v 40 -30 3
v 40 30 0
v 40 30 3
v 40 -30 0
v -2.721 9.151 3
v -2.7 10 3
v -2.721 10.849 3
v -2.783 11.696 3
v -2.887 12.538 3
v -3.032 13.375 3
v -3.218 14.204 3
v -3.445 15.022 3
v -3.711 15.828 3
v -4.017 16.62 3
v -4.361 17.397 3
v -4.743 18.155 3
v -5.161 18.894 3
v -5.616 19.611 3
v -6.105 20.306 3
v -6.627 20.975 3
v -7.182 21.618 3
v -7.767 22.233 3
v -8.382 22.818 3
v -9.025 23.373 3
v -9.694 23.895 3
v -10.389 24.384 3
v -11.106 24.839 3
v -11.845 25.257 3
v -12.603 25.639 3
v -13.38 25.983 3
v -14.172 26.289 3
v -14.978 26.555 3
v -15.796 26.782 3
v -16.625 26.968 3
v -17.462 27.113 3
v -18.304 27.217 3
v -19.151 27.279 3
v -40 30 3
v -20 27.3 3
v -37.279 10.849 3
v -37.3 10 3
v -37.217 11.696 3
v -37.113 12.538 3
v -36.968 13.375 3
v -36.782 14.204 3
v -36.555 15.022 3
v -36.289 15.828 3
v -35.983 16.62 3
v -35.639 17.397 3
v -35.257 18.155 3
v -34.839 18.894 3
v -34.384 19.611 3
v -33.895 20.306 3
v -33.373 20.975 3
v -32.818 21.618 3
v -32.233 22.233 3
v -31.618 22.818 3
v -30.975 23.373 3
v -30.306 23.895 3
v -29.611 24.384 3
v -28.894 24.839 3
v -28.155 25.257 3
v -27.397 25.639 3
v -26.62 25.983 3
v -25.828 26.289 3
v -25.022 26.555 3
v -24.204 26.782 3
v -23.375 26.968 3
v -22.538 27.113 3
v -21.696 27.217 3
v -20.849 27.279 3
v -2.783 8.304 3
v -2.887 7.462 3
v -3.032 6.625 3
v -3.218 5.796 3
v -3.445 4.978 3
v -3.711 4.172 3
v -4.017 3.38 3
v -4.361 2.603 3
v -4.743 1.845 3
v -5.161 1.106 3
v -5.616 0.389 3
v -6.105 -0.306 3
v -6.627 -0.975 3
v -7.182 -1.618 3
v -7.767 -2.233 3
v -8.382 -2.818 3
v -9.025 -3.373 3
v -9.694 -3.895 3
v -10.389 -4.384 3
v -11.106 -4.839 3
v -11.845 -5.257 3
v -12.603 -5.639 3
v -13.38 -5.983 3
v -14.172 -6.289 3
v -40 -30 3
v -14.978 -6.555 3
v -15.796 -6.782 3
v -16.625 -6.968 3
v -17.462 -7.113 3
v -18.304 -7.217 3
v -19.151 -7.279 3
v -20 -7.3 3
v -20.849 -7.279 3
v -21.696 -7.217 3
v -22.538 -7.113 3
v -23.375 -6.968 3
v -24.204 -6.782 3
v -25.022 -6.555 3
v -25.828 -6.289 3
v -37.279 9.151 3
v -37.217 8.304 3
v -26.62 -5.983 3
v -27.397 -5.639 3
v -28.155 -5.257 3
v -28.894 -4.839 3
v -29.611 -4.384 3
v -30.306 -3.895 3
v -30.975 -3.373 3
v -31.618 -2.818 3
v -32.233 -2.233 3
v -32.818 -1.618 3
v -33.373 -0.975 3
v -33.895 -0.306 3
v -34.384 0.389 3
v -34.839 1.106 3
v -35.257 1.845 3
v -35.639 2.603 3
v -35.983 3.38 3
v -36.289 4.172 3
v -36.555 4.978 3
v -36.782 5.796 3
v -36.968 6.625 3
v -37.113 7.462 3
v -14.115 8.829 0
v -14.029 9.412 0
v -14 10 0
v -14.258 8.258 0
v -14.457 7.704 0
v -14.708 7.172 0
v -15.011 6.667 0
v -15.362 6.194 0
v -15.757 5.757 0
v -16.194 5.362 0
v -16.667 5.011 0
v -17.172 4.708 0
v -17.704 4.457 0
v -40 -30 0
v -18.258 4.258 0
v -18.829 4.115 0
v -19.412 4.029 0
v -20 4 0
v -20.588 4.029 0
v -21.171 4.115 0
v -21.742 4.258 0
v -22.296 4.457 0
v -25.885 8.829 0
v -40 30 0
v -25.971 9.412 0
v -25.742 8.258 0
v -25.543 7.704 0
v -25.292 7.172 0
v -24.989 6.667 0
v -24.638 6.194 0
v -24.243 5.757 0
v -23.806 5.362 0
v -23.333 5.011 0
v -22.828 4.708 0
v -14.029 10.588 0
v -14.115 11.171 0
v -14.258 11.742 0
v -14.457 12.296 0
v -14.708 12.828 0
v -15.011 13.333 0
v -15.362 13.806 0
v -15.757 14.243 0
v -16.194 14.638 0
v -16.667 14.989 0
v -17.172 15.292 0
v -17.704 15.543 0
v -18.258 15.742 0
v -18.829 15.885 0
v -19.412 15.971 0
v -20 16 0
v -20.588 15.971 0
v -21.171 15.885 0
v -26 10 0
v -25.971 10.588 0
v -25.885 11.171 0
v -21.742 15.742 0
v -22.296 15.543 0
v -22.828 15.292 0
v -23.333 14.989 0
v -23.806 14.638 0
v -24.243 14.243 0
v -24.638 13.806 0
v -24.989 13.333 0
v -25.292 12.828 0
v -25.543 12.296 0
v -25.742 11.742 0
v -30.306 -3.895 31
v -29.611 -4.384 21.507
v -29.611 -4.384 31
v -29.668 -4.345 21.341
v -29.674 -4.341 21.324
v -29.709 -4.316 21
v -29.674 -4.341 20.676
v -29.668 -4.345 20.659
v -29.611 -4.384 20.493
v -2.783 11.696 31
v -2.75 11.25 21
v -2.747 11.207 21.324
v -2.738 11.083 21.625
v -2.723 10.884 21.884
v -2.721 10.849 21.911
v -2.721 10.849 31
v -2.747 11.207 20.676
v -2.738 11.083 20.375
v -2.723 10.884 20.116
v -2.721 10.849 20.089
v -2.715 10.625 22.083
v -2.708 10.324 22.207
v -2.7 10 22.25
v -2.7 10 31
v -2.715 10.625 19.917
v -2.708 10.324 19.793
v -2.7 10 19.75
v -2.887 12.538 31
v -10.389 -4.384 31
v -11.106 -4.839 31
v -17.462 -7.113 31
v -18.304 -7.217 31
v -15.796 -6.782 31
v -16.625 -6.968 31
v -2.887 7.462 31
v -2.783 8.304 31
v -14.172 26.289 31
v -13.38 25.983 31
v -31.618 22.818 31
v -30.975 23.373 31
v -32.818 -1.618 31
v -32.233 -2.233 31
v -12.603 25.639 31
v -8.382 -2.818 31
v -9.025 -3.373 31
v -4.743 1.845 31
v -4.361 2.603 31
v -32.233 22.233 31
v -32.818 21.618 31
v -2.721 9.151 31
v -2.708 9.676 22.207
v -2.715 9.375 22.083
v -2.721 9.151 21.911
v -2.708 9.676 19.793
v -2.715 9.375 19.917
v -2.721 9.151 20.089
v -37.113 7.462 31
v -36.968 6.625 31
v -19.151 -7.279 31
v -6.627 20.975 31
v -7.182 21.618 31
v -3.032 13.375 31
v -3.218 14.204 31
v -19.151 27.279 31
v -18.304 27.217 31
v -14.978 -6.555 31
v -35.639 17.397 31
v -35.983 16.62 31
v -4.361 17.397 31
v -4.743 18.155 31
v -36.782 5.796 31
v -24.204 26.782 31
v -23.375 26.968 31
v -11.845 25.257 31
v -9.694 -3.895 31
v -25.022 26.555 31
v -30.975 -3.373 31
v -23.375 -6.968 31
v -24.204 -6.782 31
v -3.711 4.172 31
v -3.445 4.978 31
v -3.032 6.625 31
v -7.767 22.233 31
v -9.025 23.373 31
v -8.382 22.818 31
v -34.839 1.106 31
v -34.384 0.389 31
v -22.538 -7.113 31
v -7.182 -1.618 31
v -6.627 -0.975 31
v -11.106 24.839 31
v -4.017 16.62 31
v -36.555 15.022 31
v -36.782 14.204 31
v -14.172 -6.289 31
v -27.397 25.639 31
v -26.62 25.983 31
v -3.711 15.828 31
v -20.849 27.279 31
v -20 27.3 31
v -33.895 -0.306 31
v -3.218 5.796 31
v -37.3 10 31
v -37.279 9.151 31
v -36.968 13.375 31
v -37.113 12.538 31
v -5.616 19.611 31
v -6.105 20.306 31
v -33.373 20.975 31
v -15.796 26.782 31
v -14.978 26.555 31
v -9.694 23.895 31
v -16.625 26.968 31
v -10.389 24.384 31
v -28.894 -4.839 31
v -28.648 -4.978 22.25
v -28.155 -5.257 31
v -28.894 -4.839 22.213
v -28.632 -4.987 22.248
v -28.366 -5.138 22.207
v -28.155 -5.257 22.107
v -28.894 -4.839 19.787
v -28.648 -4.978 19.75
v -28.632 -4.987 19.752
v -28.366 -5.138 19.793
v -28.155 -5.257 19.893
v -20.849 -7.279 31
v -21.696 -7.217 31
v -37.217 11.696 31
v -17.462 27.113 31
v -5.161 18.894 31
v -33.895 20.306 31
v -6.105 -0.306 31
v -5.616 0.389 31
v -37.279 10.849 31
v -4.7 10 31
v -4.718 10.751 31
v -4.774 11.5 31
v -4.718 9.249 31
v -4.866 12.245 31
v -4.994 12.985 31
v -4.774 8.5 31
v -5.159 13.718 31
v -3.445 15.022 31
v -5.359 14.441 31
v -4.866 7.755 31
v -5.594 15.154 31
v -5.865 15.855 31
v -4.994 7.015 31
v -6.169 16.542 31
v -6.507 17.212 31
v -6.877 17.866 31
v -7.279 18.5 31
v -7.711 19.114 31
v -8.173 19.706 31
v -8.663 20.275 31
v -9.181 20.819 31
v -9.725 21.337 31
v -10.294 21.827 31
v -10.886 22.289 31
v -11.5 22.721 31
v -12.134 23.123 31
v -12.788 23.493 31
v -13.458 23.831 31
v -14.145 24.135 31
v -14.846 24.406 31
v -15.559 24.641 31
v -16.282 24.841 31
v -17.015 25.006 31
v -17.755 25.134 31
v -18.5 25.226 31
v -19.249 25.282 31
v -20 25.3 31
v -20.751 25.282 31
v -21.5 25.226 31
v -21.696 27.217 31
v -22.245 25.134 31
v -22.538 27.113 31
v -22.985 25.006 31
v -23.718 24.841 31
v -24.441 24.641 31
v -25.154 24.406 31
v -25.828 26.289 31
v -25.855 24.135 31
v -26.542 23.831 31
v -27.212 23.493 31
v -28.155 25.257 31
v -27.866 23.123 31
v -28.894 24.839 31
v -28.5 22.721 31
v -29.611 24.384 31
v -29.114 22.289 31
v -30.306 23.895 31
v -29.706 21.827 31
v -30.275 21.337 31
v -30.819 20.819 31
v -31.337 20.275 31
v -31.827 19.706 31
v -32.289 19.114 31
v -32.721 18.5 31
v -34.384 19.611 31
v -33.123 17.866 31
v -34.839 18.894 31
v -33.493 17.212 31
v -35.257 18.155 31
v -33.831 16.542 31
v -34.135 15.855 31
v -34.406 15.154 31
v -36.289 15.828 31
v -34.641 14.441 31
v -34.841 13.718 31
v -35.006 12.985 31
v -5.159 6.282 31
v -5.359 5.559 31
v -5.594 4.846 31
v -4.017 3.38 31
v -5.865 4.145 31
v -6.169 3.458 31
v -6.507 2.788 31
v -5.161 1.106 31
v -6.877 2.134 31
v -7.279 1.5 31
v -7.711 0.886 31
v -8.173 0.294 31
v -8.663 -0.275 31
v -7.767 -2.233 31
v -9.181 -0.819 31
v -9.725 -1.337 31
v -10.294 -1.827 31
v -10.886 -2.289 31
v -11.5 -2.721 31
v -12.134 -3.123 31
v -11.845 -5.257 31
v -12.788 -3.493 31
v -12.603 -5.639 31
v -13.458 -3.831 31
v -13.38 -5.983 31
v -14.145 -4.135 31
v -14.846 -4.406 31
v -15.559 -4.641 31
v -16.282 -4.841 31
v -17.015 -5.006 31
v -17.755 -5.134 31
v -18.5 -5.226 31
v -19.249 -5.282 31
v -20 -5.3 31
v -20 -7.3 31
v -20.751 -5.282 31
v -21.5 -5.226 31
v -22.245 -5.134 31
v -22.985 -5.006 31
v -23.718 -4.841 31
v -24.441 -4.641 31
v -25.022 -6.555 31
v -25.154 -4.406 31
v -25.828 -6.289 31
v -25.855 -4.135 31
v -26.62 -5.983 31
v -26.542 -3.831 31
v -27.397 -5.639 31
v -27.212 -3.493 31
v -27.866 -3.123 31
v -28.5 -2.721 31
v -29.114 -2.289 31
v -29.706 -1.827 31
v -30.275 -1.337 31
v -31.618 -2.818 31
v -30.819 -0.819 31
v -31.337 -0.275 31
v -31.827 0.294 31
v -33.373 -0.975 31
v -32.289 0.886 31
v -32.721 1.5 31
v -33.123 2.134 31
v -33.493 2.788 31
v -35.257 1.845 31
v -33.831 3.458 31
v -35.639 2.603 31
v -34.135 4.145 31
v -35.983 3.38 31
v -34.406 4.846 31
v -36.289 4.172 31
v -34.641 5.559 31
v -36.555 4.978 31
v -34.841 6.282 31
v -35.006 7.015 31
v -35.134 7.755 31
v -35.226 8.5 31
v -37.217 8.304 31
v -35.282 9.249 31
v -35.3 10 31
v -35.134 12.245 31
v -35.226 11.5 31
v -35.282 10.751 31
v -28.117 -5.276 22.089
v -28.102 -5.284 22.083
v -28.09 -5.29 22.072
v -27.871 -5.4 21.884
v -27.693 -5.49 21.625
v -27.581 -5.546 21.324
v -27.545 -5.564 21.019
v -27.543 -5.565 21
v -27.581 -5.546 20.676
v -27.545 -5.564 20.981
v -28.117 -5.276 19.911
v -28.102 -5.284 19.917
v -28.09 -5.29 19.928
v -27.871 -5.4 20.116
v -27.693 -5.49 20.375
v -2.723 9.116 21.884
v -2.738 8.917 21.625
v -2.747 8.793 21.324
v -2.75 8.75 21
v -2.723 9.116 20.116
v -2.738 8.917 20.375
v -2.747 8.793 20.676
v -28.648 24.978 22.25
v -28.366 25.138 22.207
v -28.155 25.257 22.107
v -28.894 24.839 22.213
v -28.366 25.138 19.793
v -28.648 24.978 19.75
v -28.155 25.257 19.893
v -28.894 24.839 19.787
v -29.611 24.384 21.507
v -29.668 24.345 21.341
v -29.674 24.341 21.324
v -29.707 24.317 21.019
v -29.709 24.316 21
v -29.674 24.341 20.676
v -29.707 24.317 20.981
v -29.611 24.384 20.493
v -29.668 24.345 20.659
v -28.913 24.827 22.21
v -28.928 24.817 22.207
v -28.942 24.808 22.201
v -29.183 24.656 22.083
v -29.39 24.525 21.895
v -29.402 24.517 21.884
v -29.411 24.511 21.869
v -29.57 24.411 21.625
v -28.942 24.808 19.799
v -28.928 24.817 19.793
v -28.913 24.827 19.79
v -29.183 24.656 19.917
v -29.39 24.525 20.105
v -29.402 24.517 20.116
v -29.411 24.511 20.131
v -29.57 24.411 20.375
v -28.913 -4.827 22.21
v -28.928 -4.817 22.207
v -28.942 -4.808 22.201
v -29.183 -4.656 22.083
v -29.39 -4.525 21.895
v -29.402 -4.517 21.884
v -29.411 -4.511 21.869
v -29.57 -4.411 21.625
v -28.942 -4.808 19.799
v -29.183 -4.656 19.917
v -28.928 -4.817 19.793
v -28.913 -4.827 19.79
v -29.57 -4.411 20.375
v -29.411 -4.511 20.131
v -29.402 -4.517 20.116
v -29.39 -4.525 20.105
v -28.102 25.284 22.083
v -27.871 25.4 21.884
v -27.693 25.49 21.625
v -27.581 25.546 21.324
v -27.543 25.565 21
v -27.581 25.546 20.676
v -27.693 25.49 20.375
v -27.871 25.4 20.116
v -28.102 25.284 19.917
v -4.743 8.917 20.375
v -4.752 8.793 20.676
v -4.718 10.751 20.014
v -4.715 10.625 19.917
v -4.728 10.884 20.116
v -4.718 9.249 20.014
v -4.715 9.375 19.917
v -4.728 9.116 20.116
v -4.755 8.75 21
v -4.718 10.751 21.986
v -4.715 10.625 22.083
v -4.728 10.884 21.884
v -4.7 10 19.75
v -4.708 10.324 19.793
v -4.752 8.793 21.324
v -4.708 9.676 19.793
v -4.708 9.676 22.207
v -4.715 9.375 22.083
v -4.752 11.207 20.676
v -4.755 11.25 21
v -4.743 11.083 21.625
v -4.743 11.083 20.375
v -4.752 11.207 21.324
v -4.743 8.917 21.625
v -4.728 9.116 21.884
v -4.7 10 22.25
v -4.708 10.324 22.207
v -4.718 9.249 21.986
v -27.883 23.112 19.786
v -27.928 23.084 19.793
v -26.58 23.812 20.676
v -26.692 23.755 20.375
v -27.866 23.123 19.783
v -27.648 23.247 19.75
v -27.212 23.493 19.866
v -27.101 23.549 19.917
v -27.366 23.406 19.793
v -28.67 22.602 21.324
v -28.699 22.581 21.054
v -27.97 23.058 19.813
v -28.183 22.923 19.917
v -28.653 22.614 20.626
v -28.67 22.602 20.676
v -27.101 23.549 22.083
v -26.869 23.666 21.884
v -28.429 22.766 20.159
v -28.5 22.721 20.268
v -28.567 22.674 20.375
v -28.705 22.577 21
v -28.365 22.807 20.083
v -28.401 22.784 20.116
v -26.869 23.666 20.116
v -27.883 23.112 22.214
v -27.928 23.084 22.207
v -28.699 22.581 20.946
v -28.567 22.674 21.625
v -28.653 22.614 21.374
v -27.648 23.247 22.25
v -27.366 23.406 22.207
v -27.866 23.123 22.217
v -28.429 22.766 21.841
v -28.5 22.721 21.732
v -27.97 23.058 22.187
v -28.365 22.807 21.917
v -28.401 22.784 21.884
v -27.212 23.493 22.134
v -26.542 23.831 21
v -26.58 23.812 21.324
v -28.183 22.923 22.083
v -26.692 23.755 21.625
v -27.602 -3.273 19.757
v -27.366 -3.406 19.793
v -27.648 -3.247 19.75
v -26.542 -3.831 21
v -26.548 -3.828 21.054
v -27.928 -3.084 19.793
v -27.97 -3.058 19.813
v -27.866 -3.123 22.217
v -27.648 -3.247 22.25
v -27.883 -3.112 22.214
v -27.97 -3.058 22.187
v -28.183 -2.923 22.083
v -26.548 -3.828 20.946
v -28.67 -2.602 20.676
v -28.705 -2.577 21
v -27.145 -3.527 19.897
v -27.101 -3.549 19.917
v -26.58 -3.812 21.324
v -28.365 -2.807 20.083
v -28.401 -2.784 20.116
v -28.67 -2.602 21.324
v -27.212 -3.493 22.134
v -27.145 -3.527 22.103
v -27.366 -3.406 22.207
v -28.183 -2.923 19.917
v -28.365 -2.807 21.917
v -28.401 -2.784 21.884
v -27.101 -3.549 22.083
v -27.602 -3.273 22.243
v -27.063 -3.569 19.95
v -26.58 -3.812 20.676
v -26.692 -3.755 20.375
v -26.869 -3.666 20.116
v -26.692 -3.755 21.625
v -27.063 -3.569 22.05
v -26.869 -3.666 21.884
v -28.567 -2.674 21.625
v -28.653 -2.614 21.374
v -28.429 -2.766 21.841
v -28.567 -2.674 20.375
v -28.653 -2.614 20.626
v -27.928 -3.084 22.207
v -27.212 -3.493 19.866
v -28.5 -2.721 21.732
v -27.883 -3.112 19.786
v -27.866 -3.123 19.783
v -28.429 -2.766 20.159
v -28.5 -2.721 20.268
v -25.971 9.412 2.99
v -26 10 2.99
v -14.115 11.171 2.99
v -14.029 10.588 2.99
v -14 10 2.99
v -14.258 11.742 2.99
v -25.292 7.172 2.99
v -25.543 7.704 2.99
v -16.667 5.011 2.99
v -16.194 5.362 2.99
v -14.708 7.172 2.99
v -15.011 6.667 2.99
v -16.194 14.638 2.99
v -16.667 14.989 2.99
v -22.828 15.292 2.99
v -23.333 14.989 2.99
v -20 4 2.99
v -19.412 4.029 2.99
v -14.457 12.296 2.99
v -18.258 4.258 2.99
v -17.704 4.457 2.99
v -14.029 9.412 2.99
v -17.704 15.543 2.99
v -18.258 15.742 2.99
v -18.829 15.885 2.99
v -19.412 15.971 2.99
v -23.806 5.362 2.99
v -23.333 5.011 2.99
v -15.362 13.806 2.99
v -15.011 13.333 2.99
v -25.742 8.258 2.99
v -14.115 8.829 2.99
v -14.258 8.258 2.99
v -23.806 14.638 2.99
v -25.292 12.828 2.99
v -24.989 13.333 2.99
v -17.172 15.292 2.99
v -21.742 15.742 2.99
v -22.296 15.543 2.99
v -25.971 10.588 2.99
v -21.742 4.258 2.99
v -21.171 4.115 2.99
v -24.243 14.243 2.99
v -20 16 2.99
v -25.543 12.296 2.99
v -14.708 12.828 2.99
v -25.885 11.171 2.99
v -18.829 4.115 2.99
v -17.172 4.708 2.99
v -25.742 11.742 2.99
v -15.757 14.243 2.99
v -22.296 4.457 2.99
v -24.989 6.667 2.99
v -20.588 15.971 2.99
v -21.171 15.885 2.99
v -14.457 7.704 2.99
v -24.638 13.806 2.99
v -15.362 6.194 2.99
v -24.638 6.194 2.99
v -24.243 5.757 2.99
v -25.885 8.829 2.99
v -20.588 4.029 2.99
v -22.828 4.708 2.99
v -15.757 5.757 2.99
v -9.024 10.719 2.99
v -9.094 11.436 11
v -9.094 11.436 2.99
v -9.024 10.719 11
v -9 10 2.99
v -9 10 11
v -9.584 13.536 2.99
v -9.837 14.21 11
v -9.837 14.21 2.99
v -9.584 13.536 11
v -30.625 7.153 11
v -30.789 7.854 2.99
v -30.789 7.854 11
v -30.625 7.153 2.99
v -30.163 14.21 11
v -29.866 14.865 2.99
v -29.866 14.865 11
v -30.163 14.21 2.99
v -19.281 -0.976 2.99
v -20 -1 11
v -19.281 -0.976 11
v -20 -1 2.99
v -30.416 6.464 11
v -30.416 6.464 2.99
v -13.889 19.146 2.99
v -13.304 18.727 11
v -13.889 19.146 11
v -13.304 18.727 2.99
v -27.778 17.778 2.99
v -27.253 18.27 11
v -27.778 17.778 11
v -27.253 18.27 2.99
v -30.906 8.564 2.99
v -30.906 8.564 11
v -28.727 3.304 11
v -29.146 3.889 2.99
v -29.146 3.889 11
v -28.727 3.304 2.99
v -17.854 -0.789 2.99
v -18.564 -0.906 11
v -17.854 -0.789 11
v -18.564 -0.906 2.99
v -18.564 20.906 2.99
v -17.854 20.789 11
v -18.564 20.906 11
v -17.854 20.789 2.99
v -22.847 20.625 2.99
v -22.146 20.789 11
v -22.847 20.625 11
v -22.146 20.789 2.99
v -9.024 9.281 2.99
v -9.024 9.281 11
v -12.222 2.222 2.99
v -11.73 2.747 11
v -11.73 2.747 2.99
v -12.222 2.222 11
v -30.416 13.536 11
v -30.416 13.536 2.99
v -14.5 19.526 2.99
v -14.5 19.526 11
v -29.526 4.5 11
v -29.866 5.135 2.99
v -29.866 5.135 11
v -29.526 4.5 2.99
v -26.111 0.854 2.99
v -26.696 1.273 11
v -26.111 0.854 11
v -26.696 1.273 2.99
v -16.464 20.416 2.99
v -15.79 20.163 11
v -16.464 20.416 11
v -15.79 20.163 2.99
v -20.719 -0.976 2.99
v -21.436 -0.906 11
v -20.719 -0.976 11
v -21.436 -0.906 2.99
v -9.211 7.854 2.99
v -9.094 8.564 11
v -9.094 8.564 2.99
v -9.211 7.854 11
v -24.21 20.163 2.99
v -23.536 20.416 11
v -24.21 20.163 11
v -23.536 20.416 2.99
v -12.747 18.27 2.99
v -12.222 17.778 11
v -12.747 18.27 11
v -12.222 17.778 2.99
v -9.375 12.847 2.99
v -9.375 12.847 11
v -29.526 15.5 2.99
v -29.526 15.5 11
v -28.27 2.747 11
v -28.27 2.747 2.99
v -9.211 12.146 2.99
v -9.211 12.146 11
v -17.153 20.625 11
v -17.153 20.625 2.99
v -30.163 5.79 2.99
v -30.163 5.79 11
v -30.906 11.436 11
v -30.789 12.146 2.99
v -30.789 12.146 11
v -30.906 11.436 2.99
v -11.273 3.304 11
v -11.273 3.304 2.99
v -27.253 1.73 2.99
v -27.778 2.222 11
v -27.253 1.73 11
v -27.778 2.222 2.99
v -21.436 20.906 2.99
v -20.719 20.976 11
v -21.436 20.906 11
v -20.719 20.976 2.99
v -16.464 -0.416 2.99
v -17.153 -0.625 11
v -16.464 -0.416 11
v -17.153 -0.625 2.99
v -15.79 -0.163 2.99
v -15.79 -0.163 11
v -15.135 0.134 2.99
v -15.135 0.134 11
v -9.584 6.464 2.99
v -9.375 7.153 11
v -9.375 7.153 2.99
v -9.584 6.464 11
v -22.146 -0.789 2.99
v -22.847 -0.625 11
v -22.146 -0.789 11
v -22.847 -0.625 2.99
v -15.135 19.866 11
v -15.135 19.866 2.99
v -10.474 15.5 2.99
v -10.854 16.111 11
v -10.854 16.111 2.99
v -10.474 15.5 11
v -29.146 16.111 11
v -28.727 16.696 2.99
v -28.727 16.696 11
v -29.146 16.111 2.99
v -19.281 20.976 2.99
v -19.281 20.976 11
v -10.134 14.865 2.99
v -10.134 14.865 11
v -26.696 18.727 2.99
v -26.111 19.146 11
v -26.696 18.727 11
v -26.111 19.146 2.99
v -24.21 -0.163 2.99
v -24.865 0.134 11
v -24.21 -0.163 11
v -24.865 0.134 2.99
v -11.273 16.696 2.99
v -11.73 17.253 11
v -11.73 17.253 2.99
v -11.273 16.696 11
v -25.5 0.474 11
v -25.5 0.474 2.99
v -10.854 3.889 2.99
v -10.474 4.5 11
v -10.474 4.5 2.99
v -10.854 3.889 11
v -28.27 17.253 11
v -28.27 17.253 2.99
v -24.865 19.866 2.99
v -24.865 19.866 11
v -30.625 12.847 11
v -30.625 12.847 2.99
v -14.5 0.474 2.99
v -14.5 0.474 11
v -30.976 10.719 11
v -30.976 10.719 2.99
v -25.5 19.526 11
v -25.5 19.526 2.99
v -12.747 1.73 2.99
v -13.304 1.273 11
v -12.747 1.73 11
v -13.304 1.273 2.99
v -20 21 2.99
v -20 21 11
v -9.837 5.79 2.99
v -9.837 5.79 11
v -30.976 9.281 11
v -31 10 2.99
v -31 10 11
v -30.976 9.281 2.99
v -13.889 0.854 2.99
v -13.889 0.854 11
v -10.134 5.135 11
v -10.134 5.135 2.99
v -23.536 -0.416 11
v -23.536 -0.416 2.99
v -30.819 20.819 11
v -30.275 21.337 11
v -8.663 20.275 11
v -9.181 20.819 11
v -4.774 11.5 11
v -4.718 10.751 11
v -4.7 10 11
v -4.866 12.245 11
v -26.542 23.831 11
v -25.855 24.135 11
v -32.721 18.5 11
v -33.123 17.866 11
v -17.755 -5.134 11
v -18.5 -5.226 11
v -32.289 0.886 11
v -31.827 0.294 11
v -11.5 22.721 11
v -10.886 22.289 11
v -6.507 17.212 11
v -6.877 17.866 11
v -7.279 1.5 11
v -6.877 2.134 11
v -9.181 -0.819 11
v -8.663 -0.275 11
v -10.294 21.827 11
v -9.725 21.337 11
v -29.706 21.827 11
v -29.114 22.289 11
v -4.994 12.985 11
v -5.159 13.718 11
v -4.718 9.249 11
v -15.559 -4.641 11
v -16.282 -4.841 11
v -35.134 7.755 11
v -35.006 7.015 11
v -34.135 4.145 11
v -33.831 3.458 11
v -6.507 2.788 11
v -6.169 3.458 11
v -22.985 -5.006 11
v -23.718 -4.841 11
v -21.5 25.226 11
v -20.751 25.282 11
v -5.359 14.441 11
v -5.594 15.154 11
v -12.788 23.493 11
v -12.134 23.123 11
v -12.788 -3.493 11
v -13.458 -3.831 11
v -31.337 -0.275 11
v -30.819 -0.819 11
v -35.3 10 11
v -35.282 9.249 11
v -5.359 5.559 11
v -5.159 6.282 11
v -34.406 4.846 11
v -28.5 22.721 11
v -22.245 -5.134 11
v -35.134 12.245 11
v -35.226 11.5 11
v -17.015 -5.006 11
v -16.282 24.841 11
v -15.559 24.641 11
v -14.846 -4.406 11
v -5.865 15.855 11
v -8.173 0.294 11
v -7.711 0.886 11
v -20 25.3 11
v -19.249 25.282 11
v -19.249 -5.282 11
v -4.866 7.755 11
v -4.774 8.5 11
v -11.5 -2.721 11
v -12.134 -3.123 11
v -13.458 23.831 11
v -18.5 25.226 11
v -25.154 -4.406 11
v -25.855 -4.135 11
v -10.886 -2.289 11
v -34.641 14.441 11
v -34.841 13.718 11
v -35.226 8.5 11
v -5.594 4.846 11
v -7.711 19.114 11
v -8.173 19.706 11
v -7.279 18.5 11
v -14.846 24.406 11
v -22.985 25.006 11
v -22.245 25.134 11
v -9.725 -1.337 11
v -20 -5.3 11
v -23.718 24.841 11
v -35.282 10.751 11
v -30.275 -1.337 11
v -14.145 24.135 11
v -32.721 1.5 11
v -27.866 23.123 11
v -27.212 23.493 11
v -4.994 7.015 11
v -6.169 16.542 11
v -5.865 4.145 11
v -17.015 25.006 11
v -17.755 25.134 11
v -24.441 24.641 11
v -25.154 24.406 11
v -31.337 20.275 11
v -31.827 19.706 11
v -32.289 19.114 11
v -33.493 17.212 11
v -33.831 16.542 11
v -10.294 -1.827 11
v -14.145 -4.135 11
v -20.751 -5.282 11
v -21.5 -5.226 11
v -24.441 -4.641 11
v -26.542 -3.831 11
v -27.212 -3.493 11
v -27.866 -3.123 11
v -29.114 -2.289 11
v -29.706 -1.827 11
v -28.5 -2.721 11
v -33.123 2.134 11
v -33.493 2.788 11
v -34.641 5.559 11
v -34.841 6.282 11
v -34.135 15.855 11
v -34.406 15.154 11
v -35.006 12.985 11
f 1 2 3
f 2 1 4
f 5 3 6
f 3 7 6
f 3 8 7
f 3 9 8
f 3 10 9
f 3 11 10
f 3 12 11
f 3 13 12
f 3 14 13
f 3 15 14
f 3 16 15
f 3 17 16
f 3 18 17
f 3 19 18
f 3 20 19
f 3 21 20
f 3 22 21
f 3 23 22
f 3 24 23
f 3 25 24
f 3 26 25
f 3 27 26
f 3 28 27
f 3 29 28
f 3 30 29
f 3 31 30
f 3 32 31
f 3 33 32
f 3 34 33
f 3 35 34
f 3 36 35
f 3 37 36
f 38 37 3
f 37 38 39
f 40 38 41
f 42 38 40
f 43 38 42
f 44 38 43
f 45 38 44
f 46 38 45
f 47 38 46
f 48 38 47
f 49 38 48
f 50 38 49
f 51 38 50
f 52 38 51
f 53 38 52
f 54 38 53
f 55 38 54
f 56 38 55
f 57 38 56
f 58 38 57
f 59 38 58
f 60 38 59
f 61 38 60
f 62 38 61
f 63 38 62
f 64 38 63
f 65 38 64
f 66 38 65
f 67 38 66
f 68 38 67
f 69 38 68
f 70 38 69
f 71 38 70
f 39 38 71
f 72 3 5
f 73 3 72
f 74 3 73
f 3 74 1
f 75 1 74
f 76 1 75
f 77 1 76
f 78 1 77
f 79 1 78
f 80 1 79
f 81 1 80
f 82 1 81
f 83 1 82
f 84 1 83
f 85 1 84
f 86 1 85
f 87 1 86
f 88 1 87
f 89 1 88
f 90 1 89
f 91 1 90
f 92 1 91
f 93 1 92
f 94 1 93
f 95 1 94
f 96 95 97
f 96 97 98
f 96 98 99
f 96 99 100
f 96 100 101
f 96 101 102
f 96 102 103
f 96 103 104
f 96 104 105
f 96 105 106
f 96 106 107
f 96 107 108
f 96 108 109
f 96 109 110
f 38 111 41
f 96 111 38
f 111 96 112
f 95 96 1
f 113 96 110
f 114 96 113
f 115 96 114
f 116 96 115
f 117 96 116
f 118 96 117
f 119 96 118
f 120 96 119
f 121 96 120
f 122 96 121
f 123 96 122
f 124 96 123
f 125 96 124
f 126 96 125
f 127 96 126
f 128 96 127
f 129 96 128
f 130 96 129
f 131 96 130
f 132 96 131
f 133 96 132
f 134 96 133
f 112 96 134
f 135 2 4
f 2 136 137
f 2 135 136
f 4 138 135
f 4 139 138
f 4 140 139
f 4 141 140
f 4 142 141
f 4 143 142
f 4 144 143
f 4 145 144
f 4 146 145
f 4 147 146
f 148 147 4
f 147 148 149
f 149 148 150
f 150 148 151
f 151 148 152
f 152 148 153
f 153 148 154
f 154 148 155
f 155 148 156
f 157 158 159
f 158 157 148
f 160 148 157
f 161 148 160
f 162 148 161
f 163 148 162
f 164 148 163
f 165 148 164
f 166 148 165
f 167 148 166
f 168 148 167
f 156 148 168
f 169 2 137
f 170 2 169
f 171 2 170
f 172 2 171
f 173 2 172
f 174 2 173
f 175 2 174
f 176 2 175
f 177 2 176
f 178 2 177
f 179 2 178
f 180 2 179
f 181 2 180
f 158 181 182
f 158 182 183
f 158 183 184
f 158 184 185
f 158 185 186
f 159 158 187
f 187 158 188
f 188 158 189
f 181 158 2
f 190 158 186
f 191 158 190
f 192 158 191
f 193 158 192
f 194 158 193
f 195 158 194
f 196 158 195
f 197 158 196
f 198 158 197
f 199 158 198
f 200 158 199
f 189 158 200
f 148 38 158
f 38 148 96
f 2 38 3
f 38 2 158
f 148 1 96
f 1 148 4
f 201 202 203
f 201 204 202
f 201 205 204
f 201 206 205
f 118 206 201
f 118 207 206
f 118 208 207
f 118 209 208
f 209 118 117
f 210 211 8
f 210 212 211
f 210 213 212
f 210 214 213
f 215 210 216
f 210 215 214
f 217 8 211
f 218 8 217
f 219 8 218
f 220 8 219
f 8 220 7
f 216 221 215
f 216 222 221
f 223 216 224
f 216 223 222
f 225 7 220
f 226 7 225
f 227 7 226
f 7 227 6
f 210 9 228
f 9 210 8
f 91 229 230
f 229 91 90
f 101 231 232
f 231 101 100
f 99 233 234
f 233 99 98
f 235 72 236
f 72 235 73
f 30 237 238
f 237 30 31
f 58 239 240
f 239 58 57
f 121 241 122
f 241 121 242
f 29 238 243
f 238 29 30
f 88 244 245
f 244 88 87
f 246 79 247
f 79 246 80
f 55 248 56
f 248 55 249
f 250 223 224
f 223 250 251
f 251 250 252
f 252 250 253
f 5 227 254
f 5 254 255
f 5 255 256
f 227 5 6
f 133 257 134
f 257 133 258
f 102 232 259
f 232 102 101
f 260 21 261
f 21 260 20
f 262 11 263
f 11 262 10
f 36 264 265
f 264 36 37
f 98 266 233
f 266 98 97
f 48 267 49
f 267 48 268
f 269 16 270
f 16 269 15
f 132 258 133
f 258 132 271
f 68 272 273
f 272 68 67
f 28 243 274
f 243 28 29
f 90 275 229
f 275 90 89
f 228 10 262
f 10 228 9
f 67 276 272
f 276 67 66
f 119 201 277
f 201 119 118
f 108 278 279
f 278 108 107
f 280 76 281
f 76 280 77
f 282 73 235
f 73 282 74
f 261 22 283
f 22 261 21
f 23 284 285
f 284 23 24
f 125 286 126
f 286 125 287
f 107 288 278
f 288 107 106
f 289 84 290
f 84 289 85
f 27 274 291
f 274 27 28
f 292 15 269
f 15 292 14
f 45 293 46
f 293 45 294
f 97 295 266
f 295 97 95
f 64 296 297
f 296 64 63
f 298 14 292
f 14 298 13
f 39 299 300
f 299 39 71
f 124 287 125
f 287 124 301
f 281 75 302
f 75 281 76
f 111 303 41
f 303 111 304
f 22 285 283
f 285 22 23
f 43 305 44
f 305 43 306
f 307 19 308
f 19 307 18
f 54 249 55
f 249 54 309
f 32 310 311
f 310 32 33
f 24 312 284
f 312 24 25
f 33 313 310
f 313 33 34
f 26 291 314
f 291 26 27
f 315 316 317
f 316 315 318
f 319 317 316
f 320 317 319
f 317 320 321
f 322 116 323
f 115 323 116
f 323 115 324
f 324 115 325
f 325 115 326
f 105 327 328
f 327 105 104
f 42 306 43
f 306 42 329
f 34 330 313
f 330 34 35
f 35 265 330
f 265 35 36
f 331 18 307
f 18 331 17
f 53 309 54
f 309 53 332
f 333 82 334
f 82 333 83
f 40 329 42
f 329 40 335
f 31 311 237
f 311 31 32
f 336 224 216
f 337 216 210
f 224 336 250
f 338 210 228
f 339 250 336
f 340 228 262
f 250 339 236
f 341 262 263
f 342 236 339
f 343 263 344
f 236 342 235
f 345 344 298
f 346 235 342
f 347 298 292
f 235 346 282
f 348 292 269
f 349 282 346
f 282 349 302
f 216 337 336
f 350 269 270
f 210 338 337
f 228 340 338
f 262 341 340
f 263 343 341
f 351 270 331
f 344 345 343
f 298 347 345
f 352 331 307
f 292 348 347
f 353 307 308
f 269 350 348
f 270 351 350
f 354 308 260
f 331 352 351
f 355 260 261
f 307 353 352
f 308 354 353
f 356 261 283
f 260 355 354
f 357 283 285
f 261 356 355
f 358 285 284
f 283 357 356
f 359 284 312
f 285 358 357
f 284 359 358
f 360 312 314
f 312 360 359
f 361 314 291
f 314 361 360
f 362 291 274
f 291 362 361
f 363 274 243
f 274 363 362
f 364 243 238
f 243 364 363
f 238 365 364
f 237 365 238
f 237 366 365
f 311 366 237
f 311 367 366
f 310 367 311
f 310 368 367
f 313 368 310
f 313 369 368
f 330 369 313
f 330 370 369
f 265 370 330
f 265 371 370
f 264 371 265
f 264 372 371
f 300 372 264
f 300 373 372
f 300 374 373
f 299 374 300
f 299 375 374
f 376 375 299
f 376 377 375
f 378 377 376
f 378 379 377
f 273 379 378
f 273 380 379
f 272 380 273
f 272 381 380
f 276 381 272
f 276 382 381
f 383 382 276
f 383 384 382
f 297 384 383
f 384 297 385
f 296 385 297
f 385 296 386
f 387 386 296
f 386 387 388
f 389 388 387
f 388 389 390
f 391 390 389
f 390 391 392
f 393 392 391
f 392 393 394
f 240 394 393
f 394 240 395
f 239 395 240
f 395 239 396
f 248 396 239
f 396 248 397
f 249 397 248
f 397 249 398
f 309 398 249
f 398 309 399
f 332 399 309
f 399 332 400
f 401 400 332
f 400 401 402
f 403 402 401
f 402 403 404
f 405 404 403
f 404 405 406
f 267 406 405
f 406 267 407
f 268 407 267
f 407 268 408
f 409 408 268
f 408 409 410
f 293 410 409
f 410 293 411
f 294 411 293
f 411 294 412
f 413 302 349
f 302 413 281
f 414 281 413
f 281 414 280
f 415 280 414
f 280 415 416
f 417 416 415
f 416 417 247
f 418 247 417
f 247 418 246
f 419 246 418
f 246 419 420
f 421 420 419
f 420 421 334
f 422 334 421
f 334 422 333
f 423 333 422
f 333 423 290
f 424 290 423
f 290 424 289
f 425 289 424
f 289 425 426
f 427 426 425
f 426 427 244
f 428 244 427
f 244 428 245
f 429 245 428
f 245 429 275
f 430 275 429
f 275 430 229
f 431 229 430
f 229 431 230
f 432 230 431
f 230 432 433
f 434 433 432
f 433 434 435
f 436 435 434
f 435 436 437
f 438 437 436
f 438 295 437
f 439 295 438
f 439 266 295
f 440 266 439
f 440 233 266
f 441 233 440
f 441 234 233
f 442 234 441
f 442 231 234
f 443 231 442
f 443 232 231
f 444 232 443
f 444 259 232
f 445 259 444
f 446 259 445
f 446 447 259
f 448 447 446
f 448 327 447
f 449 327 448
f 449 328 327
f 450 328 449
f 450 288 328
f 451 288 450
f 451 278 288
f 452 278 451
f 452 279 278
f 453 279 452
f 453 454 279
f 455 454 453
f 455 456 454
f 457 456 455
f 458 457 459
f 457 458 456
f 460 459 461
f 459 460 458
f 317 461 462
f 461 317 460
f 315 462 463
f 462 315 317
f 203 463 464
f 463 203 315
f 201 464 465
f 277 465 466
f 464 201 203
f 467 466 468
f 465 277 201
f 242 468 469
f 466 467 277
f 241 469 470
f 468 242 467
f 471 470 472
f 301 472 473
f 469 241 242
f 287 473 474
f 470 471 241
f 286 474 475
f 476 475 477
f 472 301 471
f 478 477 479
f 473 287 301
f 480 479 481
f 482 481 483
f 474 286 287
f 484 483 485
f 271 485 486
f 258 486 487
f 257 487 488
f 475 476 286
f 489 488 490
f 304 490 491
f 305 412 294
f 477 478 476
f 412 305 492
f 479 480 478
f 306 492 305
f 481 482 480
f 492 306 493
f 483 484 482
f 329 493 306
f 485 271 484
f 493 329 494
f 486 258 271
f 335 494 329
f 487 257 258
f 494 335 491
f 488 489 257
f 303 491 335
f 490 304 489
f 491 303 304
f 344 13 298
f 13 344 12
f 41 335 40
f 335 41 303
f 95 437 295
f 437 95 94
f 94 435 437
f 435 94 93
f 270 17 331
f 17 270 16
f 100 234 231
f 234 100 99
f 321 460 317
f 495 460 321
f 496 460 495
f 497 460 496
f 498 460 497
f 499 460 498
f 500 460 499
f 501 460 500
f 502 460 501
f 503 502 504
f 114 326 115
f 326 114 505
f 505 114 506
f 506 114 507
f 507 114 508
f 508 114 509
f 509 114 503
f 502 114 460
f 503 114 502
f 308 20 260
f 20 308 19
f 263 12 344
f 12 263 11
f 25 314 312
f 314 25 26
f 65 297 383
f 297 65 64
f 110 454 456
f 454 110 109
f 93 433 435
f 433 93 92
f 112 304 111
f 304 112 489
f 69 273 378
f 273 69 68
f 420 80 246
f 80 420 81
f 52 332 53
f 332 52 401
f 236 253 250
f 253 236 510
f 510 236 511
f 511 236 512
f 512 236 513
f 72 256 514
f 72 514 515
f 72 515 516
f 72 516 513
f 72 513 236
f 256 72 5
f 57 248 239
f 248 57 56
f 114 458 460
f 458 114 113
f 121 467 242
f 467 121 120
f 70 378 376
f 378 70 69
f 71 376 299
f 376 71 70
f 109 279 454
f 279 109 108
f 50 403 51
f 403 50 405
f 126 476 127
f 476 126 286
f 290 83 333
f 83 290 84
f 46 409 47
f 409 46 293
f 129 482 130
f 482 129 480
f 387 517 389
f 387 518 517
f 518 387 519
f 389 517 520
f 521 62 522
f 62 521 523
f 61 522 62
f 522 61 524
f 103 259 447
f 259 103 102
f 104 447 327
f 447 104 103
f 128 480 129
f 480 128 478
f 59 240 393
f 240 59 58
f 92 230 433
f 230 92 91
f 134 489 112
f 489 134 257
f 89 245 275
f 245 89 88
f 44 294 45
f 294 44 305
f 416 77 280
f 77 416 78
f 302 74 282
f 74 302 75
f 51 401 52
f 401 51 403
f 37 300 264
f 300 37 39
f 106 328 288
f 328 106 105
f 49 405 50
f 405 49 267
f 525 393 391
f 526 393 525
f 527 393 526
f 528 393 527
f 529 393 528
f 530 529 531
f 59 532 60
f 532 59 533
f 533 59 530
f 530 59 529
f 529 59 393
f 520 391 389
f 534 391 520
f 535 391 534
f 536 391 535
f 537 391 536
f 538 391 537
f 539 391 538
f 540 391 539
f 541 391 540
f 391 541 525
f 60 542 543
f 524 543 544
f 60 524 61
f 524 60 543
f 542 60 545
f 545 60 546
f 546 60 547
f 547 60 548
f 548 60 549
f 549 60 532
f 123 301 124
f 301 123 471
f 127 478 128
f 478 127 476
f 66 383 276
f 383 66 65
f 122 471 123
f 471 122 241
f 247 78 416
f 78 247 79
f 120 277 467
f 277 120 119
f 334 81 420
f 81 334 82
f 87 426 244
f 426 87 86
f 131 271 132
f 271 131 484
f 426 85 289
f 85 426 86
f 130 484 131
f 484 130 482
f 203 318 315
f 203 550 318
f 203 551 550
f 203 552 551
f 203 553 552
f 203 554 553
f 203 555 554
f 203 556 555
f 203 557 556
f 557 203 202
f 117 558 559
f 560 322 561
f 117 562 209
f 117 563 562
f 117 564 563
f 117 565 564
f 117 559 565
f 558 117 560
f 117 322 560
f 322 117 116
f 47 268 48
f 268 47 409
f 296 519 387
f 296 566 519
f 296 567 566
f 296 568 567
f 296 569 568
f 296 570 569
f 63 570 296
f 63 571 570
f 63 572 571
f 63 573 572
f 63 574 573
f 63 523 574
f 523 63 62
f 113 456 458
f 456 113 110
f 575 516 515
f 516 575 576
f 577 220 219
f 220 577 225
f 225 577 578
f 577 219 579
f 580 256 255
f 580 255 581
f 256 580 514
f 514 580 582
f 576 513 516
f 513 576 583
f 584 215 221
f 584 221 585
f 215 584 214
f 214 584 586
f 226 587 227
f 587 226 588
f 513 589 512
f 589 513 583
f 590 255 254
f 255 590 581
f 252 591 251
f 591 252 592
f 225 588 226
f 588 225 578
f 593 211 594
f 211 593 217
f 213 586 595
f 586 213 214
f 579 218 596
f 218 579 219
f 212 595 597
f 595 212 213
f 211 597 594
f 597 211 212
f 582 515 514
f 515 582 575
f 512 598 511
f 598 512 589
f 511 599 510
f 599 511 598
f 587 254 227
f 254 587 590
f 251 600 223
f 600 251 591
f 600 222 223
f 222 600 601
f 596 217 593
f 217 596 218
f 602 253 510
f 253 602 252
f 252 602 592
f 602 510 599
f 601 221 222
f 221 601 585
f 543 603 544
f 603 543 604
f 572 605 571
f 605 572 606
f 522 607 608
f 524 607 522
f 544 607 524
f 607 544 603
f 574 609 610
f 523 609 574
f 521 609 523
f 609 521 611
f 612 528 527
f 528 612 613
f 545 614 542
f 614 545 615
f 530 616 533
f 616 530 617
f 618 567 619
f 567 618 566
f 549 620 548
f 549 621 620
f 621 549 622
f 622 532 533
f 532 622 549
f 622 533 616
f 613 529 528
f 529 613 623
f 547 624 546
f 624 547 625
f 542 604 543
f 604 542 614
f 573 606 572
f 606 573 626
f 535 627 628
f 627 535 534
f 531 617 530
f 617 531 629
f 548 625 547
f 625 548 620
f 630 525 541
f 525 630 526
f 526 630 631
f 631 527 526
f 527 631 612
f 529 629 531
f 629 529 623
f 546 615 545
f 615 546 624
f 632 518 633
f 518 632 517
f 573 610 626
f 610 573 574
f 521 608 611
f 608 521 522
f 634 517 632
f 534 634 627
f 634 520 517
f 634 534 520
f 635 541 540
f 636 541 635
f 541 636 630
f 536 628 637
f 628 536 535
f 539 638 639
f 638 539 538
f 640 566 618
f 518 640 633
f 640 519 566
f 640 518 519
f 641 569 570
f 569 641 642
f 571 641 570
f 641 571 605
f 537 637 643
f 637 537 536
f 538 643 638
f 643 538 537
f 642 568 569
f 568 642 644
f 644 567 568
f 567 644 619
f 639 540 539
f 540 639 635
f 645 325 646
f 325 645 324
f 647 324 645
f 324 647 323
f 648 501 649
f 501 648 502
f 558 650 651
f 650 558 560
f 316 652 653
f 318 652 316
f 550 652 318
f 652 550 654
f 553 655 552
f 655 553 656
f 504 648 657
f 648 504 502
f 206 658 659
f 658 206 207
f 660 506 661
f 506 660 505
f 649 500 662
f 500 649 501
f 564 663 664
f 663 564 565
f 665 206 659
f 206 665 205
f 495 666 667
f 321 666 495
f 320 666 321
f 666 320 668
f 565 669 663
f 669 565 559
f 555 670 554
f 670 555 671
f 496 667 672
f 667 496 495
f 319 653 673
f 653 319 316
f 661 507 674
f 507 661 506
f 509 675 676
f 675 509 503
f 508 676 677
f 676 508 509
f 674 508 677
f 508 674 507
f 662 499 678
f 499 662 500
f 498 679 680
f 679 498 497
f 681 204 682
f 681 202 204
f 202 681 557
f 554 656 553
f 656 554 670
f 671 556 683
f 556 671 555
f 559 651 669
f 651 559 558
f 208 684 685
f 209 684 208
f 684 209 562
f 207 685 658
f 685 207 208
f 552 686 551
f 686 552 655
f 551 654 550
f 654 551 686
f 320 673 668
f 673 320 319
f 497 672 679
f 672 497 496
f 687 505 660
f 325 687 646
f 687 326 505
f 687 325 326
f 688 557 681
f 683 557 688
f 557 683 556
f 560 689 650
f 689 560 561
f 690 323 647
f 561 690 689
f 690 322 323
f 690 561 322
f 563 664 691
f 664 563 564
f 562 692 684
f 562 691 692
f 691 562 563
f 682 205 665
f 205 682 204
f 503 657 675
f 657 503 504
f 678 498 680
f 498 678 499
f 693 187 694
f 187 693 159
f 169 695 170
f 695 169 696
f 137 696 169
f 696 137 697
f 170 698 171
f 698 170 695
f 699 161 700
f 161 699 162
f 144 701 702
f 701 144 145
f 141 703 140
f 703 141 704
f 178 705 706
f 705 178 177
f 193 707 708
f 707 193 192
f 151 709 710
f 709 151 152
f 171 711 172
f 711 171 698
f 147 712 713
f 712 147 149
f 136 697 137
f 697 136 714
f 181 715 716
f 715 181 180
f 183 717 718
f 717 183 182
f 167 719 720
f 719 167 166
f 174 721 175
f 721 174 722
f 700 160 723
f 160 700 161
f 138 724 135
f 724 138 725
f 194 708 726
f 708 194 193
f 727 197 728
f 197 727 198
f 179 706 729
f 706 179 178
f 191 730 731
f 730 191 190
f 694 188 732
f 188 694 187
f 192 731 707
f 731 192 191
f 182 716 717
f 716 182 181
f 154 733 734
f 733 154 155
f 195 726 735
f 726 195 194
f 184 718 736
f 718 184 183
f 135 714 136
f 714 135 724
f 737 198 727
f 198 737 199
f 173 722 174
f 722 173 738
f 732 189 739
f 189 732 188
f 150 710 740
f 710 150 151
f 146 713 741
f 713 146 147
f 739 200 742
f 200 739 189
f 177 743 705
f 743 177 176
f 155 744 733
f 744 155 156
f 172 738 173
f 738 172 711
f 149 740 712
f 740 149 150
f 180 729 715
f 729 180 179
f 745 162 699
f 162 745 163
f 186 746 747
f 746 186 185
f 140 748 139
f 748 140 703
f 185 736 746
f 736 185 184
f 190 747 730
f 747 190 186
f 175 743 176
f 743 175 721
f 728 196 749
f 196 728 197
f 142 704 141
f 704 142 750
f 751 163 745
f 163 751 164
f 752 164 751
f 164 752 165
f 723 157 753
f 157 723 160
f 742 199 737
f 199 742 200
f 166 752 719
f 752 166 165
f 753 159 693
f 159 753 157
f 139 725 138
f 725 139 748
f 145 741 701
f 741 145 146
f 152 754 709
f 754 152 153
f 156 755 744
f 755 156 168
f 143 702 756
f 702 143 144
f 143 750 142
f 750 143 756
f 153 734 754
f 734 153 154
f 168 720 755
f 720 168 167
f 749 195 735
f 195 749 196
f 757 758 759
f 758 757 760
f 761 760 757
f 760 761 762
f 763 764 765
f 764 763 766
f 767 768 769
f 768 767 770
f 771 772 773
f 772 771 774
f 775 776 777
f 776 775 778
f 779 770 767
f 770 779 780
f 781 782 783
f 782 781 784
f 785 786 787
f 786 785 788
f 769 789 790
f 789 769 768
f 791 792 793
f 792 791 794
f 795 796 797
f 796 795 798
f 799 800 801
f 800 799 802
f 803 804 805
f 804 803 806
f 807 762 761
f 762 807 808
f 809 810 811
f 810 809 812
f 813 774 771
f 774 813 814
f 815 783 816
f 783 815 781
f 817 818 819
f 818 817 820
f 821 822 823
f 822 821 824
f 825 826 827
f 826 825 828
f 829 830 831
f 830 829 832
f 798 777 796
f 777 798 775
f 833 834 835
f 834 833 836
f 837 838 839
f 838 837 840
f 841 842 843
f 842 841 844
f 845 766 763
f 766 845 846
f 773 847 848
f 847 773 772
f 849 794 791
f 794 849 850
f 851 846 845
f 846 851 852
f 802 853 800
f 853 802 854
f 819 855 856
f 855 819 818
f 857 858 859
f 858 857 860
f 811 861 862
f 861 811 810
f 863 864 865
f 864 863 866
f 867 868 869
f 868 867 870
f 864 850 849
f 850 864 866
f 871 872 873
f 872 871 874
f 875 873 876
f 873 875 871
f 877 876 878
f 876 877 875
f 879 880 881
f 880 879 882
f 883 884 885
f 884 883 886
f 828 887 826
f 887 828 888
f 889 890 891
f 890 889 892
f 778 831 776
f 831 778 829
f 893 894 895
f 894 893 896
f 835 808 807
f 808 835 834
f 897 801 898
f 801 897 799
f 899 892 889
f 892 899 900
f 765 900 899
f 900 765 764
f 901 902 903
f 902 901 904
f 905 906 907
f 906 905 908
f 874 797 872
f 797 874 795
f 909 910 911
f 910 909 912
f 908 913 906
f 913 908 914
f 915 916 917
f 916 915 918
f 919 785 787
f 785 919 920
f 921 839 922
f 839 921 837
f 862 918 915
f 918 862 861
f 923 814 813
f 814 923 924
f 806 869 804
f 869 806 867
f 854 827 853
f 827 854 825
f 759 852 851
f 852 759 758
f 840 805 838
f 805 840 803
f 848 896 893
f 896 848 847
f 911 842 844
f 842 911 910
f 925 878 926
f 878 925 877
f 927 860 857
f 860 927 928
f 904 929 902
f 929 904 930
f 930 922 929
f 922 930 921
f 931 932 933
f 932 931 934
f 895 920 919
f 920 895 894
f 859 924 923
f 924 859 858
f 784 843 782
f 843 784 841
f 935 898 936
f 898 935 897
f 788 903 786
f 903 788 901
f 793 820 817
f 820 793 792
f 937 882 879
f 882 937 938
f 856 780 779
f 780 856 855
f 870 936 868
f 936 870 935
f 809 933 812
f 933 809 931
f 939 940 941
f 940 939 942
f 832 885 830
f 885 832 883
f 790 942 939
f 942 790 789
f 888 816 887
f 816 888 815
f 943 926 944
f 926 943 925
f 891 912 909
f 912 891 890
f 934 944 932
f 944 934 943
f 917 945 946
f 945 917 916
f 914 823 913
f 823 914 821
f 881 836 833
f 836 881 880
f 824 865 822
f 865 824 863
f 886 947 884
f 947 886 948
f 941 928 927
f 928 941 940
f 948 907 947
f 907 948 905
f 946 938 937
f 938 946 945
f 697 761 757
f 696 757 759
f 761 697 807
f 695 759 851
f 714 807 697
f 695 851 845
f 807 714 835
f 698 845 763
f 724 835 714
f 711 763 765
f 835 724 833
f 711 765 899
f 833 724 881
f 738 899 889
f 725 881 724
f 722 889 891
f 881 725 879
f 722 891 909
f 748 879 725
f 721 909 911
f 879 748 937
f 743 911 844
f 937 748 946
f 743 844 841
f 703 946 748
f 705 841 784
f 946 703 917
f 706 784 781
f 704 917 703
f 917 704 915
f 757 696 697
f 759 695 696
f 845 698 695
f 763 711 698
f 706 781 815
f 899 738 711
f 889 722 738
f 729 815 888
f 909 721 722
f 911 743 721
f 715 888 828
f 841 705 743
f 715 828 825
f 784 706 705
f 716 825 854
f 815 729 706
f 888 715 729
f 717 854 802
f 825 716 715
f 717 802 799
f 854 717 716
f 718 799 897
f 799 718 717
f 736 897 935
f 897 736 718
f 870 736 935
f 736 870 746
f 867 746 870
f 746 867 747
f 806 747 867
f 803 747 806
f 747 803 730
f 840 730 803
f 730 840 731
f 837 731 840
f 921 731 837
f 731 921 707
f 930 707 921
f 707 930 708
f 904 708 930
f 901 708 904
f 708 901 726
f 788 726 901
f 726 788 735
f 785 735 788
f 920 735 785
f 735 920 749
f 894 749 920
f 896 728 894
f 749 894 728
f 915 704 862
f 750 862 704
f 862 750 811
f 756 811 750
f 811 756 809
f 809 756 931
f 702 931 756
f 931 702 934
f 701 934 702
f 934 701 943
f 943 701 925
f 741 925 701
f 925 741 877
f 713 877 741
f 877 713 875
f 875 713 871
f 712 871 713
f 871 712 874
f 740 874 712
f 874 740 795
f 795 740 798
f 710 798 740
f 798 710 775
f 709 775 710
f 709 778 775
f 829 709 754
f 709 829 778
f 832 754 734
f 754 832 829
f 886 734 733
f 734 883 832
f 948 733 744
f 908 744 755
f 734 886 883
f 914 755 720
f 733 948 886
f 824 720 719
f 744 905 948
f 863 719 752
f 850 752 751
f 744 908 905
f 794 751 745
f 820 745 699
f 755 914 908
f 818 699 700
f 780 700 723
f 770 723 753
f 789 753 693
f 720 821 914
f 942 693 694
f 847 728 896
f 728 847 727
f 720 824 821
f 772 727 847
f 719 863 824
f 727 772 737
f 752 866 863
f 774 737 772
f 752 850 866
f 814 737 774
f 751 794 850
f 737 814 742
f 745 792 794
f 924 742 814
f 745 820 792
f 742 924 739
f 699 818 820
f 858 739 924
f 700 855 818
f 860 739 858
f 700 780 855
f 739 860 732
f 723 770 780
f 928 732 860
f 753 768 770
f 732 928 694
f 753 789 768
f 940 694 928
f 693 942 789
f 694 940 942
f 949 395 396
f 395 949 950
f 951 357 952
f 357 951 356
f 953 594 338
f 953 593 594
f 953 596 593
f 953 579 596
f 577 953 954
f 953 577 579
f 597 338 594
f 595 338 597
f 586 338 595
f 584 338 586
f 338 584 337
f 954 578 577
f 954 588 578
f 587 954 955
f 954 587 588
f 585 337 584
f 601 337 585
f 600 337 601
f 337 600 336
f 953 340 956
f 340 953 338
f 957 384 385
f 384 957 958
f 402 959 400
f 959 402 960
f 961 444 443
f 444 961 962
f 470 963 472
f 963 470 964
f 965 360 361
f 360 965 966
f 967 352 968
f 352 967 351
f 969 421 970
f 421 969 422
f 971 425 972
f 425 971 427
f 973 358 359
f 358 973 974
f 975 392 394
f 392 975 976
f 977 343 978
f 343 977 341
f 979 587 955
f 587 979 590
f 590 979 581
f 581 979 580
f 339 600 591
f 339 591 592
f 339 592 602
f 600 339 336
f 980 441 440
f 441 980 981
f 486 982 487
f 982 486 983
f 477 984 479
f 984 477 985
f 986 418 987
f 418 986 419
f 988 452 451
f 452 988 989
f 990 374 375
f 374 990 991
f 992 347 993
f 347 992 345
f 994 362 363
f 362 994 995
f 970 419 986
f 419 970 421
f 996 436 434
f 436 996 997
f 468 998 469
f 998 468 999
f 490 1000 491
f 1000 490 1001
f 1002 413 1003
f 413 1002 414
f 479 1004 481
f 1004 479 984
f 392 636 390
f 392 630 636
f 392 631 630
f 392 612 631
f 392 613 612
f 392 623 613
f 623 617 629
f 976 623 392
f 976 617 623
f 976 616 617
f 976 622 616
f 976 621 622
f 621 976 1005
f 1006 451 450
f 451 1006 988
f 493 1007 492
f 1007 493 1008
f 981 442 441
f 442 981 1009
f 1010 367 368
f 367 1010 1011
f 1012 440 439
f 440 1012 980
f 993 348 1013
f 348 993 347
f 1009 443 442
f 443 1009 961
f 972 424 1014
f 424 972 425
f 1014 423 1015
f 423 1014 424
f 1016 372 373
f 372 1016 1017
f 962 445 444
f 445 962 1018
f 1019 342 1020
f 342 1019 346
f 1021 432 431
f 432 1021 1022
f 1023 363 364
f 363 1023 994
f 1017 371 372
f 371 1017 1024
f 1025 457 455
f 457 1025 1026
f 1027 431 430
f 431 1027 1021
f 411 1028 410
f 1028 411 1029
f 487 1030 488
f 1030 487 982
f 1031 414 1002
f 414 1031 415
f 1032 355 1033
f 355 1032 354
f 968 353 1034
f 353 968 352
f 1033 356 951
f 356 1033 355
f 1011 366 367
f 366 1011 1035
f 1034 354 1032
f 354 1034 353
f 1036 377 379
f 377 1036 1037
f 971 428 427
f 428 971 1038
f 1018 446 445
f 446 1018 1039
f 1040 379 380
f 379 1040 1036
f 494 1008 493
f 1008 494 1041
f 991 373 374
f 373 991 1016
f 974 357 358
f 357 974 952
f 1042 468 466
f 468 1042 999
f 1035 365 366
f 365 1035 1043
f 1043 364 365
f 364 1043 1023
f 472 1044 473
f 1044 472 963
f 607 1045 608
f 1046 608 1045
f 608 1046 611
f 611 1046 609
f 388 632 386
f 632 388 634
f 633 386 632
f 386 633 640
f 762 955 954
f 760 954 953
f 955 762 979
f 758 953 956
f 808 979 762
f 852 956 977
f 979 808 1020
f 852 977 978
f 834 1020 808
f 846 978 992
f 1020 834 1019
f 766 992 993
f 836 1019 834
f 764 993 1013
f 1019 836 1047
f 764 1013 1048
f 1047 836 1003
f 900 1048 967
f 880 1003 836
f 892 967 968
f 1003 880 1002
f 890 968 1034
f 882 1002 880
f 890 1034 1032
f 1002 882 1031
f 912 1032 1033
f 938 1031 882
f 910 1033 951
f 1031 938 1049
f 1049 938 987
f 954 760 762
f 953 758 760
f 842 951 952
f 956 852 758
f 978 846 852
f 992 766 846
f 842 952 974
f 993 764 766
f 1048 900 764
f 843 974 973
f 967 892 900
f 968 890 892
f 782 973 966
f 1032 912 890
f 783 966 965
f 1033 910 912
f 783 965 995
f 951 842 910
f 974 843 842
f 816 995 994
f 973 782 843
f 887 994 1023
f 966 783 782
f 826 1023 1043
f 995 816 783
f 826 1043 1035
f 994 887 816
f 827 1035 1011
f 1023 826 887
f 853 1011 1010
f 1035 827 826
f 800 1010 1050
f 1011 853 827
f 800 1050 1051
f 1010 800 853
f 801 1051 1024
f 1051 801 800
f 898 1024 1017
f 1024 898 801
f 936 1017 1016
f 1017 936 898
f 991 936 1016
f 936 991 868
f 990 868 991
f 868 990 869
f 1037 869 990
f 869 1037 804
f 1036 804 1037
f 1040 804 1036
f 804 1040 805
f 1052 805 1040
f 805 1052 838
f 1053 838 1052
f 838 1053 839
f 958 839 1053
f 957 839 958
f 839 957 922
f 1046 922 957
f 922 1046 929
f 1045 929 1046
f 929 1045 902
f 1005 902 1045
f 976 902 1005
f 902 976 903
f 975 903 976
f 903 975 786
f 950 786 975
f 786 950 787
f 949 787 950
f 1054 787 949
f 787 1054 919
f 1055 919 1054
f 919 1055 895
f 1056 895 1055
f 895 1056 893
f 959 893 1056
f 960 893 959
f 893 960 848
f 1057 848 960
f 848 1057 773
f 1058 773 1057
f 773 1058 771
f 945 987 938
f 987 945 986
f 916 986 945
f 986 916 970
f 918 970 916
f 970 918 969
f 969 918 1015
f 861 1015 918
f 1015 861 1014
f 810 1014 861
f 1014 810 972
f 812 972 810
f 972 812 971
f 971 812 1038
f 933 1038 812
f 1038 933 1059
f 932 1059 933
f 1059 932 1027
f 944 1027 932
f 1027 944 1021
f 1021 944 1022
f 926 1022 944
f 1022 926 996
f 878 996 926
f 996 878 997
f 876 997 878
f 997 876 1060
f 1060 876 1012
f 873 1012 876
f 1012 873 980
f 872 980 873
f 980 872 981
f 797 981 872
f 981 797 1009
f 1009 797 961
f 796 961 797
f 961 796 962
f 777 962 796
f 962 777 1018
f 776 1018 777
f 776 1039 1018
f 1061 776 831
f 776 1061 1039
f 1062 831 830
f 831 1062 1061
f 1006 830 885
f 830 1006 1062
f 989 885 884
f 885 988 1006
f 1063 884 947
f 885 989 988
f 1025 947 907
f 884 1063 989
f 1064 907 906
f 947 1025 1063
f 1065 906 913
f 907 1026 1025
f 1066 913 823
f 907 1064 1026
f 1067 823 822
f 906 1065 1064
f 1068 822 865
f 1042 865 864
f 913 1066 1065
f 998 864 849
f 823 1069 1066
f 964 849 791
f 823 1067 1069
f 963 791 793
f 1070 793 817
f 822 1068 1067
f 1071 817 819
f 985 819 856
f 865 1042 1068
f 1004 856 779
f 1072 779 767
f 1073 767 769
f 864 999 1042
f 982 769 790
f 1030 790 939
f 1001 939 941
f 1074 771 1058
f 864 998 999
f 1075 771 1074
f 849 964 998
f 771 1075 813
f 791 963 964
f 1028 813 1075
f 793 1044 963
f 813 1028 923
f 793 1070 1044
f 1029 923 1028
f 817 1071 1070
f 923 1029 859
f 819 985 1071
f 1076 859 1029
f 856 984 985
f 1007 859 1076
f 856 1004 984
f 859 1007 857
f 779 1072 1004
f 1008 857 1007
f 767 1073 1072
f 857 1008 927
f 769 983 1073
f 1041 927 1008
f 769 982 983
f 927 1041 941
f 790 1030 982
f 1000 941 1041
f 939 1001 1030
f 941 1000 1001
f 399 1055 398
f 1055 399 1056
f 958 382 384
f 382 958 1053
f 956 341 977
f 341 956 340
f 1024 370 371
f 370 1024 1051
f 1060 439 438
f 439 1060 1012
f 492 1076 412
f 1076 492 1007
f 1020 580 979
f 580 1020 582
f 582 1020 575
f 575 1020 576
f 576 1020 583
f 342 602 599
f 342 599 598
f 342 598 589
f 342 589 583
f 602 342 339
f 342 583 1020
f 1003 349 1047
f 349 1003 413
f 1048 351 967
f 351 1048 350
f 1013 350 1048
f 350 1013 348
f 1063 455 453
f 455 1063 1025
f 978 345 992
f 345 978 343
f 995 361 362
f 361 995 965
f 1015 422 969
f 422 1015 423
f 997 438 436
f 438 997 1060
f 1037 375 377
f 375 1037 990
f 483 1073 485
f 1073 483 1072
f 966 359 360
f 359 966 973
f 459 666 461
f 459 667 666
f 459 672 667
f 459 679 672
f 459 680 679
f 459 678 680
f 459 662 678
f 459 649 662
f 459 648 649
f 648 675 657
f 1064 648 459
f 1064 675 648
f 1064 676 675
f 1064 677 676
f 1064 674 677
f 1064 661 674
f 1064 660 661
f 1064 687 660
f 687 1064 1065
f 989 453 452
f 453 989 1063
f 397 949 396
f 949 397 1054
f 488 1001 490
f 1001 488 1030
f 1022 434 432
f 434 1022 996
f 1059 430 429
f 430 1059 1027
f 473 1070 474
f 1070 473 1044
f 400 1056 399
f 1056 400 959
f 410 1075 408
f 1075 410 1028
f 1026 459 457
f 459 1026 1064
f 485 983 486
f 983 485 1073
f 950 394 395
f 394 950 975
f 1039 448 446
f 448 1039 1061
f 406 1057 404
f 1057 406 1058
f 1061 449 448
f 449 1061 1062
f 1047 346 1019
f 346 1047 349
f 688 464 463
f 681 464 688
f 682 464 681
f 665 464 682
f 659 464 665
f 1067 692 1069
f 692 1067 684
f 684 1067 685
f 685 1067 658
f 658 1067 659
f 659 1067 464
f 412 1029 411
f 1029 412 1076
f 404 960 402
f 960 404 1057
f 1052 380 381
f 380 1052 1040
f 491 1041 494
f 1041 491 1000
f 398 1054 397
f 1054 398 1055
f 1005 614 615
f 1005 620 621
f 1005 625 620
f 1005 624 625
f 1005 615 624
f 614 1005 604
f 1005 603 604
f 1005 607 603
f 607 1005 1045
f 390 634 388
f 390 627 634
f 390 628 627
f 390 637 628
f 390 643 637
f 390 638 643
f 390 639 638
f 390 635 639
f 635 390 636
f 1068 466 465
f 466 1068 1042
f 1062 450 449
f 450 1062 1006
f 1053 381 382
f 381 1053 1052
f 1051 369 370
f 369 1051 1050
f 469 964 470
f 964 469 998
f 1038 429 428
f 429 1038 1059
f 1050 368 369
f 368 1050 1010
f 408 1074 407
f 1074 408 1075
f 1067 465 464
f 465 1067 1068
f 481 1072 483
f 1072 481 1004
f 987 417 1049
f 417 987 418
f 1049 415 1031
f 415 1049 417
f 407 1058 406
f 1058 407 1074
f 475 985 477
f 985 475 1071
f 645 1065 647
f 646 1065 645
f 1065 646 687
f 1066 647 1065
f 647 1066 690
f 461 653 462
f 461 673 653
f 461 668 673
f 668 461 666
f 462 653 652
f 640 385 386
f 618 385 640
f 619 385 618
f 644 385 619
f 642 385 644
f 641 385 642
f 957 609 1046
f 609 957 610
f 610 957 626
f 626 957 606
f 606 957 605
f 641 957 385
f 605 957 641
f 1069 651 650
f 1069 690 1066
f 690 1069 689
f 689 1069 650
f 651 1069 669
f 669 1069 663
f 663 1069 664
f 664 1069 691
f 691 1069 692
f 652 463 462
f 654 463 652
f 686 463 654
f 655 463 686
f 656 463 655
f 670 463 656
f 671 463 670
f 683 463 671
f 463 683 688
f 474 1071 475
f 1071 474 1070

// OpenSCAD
// KNOWN-WRONG PART (must fail): the sleeve wall is 2 mm (34.6 mm outer diameter) instead of 3 mm
// Phone adapter for a microscope eyepiece with a 30 mm outer diameter
// Category: hardware. A phone plate with an off-centre camera hole and, on the same axis, a sleeve
// that slides over the eyepiece. The sleeve bore steps down to 22 mm near the plate (a stop that
// fixes the camera-to-eyepiece distance); three radial M3 holes take centring screws.
// Print: PLA or PETG, phone side (plate) on the bed, 0.2 mm layers; tap the 2.5 mm holes for M3
// nylon screws. Hold the phone on the plate with rubber bands.
// SPDX-License-Identifier: CERN-OHL-P-2.0

/* [Adapter] */
plate = [80, 60, 3];      // X, Y, thickness [mm], centred on the origin
cam = [-20, 10];          // camera-hole axis
cam_d = 12;
sleeve_od = 34.6;
stop_d = 22;              // bore from z = 3 to 11
stop_top = 11;
bore_d = 30.6;            // bore from z = 11 to the top (30 mm eyepiece + clearance)
sleeve_top = 31;
screw_d = 2.5;            // M3 tapping holes
screw_z = 21;
screw_angles = [0, 120, 240];  // first one points in +X

/* [Hidden] */
eps = 0.01;

difference() {
    union() {
        translate([-plate.x / 2, -plate.y / 2, 0]) cube(plate);
        translate([cam.x, cam.y, plate.z - eps]) cylinder(d = sleeve_od, h = sleeve_top - plate.z + eps, $fn = 128);
    }
    translate([cam.x, cam.y, -1]) cylinder(d = cam_d, h = plate.z + 2, $fn = 64);
    translate([cam.x, cam.y, plate.z - eps]) cylinder(d = stop_d, h = stop_top - plate.z + 2 * eps, $fn = 96);
    translate([cam.x, cam.y, stop_top]) cylinder(d = bore_d, h = sleeve_top - stop_top + 1, $fn = 128);
    for (a = screw_angles)
        translate([cam.x, cam.y, screw_z]) rotate([0, 0, a]) rotate([0, 90, 0])
            cylinder(d = screw_d, h = sleeve_od / 2 + 1, $fn = 24);
}
